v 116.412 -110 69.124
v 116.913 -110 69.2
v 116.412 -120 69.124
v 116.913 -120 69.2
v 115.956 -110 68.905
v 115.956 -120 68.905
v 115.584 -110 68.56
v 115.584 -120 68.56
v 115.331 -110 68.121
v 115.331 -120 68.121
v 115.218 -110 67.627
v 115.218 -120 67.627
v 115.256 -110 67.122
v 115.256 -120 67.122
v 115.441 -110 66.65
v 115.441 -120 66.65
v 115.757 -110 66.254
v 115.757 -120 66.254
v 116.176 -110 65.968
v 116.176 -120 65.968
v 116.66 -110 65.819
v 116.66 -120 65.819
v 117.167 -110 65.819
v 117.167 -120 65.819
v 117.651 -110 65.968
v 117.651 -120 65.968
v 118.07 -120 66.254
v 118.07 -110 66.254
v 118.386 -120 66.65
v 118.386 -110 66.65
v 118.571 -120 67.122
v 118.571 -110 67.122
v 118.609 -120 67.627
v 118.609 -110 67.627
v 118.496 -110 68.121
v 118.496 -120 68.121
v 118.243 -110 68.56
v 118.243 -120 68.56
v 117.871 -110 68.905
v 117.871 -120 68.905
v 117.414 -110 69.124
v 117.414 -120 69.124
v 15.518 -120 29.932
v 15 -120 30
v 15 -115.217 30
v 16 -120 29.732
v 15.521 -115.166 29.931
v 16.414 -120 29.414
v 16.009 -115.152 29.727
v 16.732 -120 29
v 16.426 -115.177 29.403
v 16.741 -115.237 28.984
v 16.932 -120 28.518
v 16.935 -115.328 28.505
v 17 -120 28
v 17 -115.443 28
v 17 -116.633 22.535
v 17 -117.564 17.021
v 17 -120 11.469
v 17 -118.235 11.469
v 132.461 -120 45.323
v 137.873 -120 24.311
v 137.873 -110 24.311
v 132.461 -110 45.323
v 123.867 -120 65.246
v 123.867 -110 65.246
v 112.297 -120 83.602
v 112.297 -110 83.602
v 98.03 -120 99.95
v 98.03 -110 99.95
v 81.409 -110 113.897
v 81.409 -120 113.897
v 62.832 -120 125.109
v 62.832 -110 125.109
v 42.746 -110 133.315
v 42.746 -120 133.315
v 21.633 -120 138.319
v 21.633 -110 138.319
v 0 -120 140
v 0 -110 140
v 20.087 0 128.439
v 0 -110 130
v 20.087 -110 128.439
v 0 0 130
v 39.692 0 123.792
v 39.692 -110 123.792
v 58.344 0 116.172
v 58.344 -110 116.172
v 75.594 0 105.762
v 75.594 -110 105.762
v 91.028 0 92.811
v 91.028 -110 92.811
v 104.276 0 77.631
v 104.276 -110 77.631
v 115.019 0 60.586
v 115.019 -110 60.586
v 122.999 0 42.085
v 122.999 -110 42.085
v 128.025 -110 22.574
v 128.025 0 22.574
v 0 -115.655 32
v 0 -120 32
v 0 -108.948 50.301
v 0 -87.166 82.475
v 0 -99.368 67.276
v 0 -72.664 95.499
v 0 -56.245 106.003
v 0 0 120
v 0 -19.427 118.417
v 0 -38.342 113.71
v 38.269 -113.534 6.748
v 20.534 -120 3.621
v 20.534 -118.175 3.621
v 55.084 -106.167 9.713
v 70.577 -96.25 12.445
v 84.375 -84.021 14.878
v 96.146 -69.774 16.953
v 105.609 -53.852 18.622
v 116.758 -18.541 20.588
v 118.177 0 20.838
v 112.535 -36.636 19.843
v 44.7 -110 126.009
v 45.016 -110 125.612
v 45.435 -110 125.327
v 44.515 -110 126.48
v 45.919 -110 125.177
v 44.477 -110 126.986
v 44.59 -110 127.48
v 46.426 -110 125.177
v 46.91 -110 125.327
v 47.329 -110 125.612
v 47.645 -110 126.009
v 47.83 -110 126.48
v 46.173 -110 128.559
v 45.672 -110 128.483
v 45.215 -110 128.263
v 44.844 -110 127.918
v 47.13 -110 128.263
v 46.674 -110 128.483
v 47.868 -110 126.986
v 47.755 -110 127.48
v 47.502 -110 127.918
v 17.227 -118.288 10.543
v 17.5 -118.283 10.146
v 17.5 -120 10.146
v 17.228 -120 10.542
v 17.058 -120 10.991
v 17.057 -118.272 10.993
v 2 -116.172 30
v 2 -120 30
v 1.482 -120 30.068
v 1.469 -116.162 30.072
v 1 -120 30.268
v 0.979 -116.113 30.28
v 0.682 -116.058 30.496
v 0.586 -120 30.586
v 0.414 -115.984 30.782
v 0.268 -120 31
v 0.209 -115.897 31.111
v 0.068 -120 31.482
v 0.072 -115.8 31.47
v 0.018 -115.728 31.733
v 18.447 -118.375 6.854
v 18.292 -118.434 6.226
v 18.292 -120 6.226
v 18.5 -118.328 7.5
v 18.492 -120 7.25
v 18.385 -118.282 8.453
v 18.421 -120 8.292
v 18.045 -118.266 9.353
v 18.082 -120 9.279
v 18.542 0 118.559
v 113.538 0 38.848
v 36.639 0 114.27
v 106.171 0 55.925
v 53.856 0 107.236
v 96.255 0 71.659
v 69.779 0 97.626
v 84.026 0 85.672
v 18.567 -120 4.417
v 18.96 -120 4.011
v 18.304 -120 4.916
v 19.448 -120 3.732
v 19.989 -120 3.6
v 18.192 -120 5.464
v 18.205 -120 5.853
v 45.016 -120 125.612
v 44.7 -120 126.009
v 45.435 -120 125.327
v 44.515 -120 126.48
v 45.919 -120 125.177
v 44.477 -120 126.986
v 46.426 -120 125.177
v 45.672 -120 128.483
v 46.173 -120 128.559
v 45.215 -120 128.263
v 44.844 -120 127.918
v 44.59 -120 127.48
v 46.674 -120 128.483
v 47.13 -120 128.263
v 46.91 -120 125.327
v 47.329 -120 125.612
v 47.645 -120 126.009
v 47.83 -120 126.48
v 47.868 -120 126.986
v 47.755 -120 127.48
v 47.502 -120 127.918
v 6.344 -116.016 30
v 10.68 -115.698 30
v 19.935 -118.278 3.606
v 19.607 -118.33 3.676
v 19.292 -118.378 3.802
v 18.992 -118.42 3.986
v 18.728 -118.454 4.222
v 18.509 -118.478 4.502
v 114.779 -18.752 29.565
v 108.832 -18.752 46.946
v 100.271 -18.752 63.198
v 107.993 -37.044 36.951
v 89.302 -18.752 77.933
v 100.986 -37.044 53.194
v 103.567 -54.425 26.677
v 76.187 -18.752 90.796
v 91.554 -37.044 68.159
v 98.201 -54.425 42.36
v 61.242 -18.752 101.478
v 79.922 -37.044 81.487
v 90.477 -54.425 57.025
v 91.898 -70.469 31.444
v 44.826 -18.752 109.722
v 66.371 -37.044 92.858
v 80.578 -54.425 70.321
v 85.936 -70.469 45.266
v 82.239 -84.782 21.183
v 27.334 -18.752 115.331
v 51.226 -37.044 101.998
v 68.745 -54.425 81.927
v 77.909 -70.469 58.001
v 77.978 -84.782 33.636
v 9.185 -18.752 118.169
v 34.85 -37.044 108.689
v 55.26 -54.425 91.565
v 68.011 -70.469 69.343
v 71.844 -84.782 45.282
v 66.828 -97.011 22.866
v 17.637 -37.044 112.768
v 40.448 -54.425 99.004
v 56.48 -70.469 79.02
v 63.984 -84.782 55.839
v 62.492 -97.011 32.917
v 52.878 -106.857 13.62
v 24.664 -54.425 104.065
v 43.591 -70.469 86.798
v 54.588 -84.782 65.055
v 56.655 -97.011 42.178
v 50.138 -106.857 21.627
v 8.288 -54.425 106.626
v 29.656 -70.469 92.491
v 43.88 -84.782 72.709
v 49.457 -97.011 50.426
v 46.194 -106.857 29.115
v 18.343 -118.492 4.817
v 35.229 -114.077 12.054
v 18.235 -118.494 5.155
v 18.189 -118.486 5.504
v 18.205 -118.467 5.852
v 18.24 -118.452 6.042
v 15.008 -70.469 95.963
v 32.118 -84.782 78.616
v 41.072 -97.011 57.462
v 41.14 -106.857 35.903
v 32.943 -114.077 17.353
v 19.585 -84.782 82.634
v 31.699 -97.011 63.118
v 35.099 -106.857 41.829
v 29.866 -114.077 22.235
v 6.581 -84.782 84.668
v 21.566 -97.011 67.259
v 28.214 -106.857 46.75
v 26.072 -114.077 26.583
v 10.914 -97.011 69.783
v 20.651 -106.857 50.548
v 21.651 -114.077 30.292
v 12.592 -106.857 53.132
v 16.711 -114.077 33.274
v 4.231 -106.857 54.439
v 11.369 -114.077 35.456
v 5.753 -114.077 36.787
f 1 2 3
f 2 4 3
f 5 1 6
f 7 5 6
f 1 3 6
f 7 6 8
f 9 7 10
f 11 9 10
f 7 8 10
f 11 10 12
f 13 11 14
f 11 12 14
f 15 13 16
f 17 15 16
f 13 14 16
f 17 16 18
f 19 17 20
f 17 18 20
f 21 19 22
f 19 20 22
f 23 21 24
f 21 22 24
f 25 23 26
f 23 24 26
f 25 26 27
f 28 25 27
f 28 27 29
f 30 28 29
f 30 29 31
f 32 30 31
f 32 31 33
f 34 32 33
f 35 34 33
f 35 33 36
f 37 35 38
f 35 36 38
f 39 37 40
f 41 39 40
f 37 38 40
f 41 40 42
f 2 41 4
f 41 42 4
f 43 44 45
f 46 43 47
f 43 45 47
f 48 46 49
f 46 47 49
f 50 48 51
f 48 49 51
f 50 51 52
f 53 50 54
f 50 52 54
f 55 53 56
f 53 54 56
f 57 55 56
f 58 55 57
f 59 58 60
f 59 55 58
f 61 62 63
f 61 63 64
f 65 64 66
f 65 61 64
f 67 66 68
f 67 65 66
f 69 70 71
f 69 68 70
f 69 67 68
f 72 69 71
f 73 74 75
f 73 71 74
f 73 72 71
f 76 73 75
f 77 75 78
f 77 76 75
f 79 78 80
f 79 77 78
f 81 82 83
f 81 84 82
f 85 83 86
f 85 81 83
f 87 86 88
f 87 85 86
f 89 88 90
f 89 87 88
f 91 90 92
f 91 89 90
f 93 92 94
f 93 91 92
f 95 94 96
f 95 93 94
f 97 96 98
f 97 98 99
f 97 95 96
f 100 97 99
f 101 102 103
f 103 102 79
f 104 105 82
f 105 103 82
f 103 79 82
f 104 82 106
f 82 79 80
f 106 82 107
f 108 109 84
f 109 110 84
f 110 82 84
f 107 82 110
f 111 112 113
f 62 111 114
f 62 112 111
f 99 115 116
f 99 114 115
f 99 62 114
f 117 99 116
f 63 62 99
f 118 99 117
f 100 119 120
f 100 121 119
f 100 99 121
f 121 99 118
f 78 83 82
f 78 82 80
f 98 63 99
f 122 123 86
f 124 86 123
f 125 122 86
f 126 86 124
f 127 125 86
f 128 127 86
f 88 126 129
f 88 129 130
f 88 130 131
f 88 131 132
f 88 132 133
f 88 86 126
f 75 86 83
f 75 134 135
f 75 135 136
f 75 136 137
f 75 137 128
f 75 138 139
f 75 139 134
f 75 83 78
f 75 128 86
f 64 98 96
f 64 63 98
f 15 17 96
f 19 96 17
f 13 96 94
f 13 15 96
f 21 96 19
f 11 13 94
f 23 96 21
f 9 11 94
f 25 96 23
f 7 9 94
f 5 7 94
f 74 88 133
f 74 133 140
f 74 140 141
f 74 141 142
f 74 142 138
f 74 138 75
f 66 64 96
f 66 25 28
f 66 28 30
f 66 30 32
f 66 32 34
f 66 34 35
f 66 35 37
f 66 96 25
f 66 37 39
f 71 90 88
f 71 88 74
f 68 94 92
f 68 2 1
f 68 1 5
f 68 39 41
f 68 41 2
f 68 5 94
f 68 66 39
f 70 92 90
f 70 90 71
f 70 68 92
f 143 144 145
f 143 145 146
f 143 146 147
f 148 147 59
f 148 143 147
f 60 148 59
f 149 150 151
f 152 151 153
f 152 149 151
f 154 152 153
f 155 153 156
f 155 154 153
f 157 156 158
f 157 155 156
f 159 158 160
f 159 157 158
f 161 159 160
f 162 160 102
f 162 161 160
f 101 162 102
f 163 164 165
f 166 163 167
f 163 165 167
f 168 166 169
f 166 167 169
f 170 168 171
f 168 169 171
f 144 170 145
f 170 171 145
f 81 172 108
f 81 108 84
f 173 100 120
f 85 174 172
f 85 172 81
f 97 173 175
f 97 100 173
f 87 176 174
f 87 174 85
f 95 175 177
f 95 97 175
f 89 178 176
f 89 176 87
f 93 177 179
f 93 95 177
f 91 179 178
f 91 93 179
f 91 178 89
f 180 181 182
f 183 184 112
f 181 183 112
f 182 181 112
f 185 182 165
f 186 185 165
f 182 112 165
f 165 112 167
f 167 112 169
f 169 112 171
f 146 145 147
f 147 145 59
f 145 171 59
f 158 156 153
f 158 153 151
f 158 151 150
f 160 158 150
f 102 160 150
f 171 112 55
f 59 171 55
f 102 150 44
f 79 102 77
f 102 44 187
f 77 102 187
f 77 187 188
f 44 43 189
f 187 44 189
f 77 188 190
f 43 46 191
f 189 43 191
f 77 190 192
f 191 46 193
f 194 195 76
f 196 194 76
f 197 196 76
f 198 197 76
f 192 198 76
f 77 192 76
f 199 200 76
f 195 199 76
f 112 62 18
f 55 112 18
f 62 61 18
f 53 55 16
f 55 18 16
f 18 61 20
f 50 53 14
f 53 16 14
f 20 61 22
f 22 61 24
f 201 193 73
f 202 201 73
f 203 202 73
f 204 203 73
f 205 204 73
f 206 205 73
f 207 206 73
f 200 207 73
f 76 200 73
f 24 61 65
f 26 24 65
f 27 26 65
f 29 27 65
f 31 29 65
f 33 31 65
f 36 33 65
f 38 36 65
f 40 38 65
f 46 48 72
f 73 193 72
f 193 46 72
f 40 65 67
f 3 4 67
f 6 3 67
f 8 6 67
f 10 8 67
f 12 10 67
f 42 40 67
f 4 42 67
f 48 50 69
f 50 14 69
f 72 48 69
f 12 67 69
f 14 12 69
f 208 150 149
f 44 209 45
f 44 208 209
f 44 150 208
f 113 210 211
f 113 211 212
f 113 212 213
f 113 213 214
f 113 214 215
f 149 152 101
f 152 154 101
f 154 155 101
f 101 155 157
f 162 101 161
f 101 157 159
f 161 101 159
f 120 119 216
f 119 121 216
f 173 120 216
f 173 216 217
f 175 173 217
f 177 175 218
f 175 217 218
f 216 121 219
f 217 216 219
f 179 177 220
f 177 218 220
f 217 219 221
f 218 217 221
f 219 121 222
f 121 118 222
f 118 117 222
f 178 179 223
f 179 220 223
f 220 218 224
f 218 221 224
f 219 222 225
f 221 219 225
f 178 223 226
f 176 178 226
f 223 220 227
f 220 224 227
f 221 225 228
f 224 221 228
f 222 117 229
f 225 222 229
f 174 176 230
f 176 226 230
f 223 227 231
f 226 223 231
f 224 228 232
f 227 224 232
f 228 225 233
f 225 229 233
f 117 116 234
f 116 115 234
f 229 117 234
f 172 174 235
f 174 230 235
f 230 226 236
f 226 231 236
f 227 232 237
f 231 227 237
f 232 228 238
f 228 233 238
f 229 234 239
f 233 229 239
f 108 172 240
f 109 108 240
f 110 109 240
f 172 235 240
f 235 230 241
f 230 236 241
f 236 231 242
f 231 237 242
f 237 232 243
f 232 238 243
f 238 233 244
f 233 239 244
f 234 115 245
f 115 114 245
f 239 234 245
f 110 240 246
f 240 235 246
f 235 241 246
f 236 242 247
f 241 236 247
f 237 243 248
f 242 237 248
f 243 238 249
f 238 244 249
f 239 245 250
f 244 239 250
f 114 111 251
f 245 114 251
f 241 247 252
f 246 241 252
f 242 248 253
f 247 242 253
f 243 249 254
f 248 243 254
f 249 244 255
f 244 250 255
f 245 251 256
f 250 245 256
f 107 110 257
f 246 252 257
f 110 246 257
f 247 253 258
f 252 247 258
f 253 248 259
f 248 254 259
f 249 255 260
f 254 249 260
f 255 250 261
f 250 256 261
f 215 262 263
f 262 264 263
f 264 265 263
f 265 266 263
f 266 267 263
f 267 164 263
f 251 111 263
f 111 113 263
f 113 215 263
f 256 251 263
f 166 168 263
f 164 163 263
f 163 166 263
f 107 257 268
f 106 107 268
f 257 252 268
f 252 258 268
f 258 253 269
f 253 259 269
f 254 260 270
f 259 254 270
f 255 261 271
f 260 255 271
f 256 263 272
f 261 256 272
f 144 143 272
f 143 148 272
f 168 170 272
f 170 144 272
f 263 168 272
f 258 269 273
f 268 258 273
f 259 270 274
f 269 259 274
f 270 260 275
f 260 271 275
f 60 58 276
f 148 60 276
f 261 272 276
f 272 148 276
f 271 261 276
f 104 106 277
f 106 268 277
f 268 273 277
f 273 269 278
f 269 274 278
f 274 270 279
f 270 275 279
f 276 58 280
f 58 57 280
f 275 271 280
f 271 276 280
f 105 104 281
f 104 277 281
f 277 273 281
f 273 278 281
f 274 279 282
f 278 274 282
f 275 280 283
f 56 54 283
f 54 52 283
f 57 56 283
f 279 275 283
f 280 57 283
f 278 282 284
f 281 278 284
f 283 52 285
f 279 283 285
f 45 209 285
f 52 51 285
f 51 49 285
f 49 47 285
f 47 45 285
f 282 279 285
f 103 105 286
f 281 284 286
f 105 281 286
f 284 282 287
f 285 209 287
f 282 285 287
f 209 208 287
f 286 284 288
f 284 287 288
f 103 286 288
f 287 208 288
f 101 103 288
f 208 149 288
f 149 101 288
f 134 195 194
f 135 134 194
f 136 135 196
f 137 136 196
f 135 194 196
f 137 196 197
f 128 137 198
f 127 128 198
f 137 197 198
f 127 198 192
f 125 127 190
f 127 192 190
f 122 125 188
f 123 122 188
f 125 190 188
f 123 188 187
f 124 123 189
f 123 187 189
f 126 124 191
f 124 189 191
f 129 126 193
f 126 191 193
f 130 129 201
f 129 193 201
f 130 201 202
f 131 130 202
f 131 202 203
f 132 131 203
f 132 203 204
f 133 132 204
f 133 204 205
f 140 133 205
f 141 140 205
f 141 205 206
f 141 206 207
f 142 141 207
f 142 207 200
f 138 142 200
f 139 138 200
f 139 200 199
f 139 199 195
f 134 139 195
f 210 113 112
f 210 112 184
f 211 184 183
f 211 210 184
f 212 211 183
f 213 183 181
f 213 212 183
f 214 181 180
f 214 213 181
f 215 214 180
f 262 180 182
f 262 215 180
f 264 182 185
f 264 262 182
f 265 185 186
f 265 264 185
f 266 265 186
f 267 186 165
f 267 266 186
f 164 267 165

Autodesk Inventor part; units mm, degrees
ref_plane "YZ Plane" through (0, 0, 0) normal (1, 0, 0) x (0, 1, 0)
ref_plane "XZ Plane" through (0, 0, 0) normal (0, 1, 0) x (-1, 0, 0)
ref_plane "XY Plane" through (0, 0, 0) normal (0, 0, 1) x (1, 0, 0)
sketch "スケッチ1" plane through (0, 0, 0) normal (1, 0, 0) x (0, 1, 0)
  circle A0 centre (0, 0) radius 120
  circle A1 centre (0, 0) radius 130
  line L0 (0, 0) -> (84.8528, 84.8528)
  line L1 (0, 0) -> (0, 120)
  line L2 (84.8528, 84.8528) -> (91.9239, 91.9239)
  line L3 (-130, 237.6299) -> (-130, -340.0687)
  line L4 (58.9191, 140) -> (-130, 140)
  line L5 (0, 0) -> (-130, 0)
  line L6 (0, 120) -> (0, 130)
  line L7 (-120, 140) -> (-120, 130)
  line L8 (-120, 130) -> (0, 130)
  line L9 (-120, 0) -> (-120, 140)
  line L10 (-110, 140) -> (-110, 130)
  point P0 (-120, 0)
  dimension "d0" = 240
  dimension "d1" = 10
  dimension "d2" = 45
  dimension "d3" = 140
  dimension "d4" = 0
  dimension "d5" = 10
  dimension "d6" = 10
  dimension "d8" = 10
revolve "回転1" add sketch "スケッチ1" angle 80 about axis through (0, 0, 0) along (0, 1, 0) contours L9 A1 L6 A0 | L9 L8 A1 | L7 L4 L10 L8
sketch "スケッチ2" plane through (0, -110, 140) normal (0, 1, 0) x (1, 0, 0)
  line L0 (137.8731, 115.6893) -> (0, 140) projected
  line L1 (0, 0) -> (0, 140) projected
  circle A0 centre (0, 140) radius 140
  circle A1 centre (0, 140) radius 135
  point P0 (46.1727, 13.1415)
  point P1 (116.9134, 72.5)
  dimension "d9" = 5
  dimension "d10" = 20
  dimension "d11" = 20
hole "穴1" at (46.1727, -110, 126.8585) at (116.9134, -110, 67.5) direction (0, -1, 0) diameter 3.4 end through all
sketch "スケッチ3" plane through (0, -120, 0) normal (0, -1, 0) x (1, 0, 0)
  line L0 (17, -30) -> (-17, -30)
  line L1 (-17, -30) -> (-17, 30)
  line L2 (-17, 30) -> (17, 30)
  line L3 (17, 30) -> (17, -30)
  circle A0 centre (14.5, 7.5) radius 4
  point P0 (0, 0)
  point P1 (17, 10.6225)
  point P2 (17, 4.3775)
  dimension "d19" = 34
  dimension "d20" = 60
  dimension "d21" = 30
  dimension "d22" = 17
  dimension "d25" = 8
  dimension "d26" = 2.5
  dimension "d27" = 22.5
extrude "押し出し1" cut sketch "スケッチ3" against normal blind 10
fillet "フィレット2" radius 2 5 edges at (17, -119.376, 2.9976) (17, -119.3545, 4.3775) (17, -119.1569, 10.6225) (17, -117.4696, 30) (0, -118.0948, 30)
properties part number "belt_liner_v1_3DP_C_B_U" material "ABS プラスチック"
